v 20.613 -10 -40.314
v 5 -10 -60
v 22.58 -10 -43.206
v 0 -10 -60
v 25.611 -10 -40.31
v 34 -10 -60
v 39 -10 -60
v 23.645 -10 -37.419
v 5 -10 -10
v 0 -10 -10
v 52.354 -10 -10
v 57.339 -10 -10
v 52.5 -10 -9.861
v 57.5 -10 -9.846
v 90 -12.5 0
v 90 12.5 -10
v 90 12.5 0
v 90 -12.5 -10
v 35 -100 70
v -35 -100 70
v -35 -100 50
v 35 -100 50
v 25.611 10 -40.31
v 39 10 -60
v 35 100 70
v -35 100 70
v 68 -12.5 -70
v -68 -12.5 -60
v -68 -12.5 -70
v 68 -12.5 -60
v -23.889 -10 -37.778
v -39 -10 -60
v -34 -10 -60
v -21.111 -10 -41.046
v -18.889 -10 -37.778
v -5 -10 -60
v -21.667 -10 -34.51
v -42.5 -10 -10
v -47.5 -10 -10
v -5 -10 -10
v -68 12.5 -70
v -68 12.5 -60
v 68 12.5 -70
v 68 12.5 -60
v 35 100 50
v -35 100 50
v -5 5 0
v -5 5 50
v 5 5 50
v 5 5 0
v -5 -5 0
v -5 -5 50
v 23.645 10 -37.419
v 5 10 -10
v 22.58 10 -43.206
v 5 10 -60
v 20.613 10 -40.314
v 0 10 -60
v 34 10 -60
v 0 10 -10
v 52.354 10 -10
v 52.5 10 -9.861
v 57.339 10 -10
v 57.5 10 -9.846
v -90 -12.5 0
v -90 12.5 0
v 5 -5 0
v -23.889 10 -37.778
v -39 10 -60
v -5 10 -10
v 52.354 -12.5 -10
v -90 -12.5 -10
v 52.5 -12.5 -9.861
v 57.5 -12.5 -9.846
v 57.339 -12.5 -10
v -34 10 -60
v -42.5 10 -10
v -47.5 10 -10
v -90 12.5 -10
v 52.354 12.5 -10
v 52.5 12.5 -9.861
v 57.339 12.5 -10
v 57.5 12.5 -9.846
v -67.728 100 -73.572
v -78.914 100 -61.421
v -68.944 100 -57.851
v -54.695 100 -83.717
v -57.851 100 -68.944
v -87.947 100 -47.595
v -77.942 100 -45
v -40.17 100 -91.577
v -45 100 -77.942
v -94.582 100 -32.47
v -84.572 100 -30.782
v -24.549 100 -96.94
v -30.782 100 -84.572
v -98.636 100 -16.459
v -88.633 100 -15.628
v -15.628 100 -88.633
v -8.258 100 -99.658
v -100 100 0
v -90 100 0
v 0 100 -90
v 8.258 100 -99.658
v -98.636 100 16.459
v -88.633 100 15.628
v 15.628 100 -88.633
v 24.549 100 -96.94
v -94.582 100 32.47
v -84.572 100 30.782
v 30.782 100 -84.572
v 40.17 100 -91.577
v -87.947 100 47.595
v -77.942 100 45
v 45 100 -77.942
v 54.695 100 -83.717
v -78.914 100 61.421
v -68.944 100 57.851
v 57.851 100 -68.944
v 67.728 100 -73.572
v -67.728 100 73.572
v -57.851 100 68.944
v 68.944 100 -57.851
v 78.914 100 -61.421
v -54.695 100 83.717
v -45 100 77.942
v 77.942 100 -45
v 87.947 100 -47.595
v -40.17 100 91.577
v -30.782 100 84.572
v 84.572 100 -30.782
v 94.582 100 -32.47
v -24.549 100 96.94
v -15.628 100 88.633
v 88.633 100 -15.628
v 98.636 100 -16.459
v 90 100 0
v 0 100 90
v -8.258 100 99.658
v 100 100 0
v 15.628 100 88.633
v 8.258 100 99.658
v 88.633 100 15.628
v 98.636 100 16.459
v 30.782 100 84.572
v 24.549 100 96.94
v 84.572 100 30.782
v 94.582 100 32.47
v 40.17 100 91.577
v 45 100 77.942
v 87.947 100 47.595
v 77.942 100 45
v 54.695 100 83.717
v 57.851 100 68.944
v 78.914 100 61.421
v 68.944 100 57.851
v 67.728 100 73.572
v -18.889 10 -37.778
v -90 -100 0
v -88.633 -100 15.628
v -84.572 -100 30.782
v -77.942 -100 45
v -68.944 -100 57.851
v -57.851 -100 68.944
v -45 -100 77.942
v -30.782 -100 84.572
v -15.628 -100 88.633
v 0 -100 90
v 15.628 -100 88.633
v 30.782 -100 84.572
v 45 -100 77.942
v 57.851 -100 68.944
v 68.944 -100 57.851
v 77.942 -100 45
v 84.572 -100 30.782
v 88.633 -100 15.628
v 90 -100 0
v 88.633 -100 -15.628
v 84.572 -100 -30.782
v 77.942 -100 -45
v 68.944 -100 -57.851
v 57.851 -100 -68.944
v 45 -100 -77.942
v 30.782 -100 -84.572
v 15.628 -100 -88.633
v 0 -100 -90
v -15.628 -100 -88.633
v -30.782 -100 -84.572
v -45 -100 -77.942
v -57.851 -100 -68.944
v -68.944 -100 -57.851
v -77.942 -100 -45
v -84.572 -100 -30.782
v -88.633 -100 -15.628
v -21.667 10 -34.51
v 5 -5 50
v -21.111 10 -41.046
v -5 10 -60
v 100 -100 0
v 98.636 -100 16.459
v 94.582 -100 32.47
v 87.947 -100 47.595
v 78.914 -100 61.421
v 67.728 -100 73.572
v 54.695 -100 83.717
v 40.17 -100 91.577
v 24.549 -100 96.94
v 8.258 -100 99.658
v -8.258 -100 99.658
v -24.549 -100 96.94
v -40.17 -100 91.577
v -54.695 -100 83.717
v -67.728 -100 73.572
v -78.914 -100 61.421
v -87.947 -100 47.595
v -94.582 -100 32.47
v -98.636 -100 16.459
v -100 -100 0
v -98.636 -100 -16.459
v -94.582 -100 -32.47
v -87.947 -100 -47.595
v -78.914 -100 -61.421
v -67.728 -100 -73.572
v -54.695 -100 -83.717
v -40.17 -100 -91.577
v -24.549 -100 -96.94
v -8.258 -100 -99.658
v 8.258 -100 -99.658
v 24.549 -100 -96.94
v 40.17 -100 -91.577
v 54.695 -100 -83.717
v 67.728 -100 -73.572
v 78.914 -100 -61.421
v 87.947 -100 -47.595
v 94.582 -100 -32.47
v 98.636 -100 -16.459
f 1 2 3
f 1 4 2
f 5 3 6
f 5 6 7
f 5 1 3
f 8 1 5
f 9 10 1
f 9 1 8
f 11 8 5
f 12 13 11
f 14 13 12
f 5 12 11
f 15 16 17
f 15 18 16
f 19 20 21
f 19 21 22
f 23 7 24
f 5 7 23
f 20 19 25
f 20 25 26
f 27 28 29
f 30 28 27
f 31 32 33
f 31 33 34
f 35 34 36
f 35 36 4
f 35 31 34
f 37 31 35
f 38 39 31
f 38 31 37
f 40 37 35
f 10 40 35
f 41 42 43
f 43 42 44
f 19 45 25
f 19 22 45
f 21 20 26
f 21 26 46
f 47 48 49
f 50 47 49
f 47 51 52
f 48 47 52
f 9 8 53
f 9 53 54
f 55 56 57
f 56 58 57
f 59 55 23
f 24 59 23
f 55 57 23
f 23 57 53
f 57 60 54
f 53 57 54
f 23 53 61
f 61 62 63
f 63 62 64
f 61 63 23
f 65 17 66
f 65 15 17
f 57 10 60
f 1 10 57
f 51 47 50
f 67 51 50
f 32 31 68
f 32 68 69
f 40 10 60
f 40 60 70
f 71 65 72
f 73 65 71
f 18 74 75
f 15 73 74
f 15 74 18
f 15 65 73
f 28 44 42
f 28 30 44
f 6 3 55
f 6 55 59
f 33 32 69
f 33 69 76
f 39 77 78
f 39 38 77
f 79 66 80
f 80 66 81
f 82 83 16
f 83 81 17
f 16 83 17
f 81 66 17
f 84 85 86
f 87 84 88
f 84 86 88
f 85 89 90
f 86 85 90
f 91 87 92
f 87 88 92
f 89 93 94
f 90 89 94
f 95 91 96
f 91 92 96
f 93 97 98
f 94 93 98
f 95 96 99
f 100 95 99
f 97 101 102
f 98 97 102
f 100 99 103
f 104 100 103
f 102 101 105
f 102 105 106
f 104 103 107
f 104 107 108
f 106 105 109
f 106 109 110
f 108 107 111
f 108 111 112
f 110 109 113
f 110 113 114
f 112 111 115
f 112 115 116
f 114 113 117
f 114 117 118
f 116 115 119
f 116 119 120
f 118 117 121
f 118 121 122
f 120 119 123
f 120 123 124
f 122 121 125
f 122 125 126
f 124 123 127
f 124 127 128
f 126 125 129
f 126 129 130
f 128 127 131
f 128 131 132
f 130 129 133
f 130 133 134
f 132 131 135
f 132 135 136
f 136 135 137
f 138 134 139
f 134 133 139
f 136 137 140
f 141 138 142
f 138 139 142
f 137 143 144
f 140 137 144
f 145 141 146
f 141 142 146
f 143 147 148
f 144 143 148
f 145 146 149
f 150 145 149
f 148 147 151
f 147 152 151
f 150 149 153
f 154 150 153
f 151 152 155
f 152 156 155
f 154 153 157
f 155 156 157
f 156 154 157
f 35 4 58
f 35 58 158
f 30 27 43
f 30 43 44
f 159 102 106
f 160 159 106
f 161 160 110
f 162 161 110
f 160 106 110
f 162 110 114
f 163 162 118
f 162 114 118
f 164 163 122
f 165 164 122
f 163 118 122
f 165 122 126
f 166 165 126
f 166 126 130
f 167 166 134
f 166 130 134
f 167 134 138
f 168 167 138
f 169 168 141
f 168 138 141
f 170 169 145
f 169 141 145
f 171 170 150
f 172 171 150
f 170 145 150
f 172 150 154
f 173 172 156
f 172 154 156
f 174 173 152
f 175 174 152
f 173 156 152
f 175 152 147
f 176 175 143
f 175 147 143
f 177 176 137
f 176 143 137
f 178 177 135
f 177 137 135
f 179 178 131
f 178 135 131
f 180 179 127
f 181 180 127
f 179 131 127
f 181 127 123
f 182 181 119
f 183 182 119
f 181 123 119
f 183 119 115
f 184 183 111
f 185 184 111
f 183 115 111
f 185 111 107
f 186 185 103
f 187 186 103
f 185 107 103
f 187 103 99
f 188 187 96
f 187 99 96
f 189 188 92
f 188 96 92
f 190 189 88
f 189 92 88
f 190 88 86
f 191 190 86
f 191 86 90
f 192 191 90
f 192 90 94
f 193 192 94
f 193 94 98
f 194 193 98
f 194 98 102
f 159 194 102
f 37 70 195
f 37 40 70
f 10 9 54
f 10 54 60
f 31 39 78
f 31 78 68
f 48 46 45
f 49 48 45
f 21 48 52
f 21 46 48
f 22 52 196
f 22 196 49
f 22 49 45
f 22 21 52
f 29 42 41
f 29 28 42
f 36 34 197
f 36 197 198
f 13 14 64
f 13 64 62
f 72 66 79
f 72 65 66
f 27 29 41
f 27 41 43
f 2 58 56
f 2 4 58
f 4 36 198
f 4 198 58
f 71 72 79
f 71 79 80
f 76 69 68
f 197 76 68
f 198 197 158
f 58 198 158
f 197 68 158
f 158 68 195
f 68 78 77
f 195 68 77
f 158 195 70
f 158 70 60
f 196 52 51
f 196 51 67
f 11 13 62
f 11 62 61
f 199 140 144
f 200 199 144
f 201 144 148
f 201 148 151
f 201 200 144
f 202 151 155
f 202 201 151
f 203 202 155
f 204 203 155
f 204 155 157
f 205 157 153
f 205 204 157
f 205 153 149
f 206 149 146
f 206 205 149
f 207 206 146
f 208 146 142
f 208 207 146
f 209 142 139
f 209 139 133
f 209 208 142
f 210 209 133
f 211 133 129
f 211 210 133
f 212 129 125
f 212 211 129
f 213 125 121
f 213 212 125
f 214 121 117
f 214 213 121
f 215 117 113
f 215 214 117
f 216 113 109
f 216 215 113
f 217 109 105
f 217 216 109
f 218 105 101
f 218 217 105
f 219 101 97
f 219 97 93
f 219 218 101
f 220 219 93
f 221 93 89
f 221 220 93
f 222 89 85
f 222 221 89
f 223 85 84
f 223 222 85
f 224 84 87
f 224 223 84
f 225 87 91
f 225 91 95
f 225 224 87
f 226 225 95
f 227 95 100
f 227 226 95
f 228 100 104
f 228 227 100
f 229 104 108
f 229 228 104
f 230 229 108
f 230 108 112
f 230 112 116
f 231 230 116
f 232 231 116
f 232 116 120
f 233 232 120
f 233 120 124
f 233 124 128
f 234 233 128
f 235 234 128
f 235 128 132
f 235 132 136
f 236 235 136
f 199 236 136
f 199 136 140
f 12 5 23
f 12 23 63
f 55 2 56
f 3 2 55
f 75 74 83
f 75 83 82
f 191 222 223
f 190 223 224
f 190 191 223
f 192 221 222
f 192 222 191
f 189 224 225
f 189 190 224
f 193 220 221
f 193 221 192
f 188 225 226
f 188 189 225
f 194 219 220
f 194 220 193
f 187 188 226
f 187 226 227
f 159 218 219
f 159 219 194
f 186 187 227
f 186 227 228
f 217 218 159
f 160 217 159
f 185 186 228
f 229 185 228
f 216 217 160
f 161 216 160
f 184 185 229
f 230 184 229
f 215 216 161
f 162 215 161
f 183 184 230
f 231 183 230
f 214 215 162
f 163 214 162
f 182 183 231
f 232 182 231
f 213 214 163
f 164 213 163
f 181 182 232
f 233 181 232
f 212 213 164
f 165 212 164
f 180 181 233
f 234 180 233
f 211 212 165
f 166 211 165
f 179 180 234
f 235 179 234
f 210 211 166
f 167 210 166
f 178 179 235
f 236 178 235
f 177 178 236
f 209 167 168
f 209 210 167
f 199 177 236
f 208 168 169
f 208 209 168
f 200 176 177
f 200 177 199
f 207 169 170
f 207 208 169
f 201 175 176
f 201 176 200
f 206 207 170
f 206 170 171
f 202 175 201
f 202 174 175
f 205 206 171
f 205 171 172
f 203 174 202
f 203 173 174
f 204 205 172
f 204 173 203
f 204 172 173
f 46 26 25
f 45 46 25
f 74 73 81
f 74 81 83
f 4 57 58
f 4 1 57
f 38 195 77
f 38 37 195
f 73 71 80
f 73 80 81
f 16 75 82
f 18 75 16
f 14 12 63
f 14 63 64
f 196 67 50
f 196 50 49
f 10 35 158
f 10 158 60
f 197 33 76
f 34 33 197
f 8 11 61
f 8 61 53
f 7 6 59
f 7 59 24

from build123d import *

# Parameters (mm, degrees)
F0_R     = 100
F1_DEPTH = 100
F2_R     = 90
F3_DEPTH = 200
F5_DEPTH = 100
F4_W     = 4.9999998882
F4_H     = 50
F4_W_2   = 5
F6_DEPTH = 5
F7_DEPTH = 12.5
F8_DEPTH = 10


# Not quite as in the source:
# - a feature names something its author has since deleted; it is built from what else it names


with BuildPart() as f1:
    # F0 (on Front) → F1 (new body, symmetric)
    with BuildSketch(Plane.XZ):
        Circle(F0_R)
    extrude(amount=F1_DEPTH, both=True)

    # F2 (on face) → F3 (cut)
    with BuildSketch(Plane(origin=(0, 100, 0), x_dir=(-1, 0, 0), z_dir=(0, 1, 0))):
        Circle(F2_R)
    extrude(amount=-F3_DEPTH, mode=Mode.SUBTRACT)


with BuildPart() as f5:
    # F4 (on Front) → F5 (new body, symmetric)
    with BuildSketch(Plane.XZ):
        Polygon((-4.9999998882, 50), (0, 50), (5, 50), (35, 50), (35, 70), (-35, 70), (-35, 50), align=None)
    extrude(amount=F5_DEPTH, both=True)

    # F4 (on Front) → F6 (join, symmetric)
    with BuildSketch(Plane.XZ):
        with Locations((-2.4999999441, 25)):
            Rectangle(F4_W, F4_H)
        with Locations((2.5, 25)):
            Rectangle(F4_W_2, F4_H)
    extrude(amount=F6_DEPTH, both=True)


with BuildPart() as f7:
    # F4 (on Front) → F7 (new body, symmetric)
    with BuildSketch(Plane.XZ):
        Polygon((5, 0), (0, 0), (-4.9999998882, 0), (-90, 0), (-90, -10), (-47.5, -10), (-42.5, -10), (-40.6034433022, -10), (-5, -10), (0, -10), (5, -10), (52.3540072756, -10), (52.5, -9.8605715856), (57.5, -9.8458949104), (57.3386868395, -10), (90, -10), (90, 0), (45, 0), align=None)
    extrude(amount=F7_DEPTH, both=True)


with BuildPart() as f7b:
    # F4 (on Front) → F7, piece 2 (new body, symmetric)
    with BuildSketch(Plane.XZ):
        Polygon((-34, -60), (-39, -60), (-64.5170719501, -60), (-68, -60), (-68, -70), (0, -70), (68, -70), (68, -60), (39, -60), (34, -60), (5, -60), (0, -60), (-5, -60), align=None)
    extrude(amount=F7_DEPTH, both=True)


with BuildPart() as f8:
    # F4 (on Front) → F8 (new body, symmetric)
    with BuildSketch(Plane.XZ):
        Polygon((-42.5, -10), (-47.5, -10), (-23.8888888889, -37.7777777778), (-21.6666666667, -34.5098039216), align=None)
        Polygon((-21.1111111111, -41.045751634), (-23.8888888889, -37.7777777778), (-39, -60), (-34, -60), align=None)
        Polygon((-21.6666666667, -34.5098039216), (-23.8888888889, -37.7777777778), (-21.1111111111, -41.045751634), (-18.8888888889, -37.7777777778), align=None)
        Polygon((-5, -10), (-21.6666666667, -34.5098039216), (-18.8888888889, -37.7777777778), (0, -10), align=None)
        Polygon((-18.8888888889, -37.7777777778), (-21.1111111111, -41.045751634), (-5, -60), (0, -60), align=None)
    extrude(amount=F8_DEPTH, both=True)


with BuildPart() as f8b:
    # F4 (on Front) → F8, piece 2 (new body, symmetric)
    with BuildSketch(Plane.XZ):
        Polygon((5, -60), (22.579858739, -43.2056746161), (20.6132442897, -40.3135945437), (0, -60), align=None)
        Polygon((22.579858739, -43.2056746161), (25.6108688664, -40.3101012741), (23.6446037441, -37.4185349178), (20.6132442897, -40.3135945437), align=None)
        Polygon((39, -60), (25.6108688664, -40.3101012741), (22.579858739, -43.2056746161), (34, -60), align=None)
        Polygon((52.3540072756, -10), (57.3386868395, -10), (57.5, -9.8458949104), (52.5, -9.8605715856), align=None)
        Polygon((20.6132442897, -40.3135945437), (23.6446037441, -37.4185349178), (5, -10), (0, -10), align=None)
        Polygon((25.6108688664, -40.3101012741), (57.3386868395, -10), (52.3540072756, -10), (23.6446037441, -37.4185349178), align=None)
    extrude(amount=F8_DEPTH, both=True)


solid = Compound([f1.part, f5.part, f7.part, f7b.part, f8.part, f8b.part])
